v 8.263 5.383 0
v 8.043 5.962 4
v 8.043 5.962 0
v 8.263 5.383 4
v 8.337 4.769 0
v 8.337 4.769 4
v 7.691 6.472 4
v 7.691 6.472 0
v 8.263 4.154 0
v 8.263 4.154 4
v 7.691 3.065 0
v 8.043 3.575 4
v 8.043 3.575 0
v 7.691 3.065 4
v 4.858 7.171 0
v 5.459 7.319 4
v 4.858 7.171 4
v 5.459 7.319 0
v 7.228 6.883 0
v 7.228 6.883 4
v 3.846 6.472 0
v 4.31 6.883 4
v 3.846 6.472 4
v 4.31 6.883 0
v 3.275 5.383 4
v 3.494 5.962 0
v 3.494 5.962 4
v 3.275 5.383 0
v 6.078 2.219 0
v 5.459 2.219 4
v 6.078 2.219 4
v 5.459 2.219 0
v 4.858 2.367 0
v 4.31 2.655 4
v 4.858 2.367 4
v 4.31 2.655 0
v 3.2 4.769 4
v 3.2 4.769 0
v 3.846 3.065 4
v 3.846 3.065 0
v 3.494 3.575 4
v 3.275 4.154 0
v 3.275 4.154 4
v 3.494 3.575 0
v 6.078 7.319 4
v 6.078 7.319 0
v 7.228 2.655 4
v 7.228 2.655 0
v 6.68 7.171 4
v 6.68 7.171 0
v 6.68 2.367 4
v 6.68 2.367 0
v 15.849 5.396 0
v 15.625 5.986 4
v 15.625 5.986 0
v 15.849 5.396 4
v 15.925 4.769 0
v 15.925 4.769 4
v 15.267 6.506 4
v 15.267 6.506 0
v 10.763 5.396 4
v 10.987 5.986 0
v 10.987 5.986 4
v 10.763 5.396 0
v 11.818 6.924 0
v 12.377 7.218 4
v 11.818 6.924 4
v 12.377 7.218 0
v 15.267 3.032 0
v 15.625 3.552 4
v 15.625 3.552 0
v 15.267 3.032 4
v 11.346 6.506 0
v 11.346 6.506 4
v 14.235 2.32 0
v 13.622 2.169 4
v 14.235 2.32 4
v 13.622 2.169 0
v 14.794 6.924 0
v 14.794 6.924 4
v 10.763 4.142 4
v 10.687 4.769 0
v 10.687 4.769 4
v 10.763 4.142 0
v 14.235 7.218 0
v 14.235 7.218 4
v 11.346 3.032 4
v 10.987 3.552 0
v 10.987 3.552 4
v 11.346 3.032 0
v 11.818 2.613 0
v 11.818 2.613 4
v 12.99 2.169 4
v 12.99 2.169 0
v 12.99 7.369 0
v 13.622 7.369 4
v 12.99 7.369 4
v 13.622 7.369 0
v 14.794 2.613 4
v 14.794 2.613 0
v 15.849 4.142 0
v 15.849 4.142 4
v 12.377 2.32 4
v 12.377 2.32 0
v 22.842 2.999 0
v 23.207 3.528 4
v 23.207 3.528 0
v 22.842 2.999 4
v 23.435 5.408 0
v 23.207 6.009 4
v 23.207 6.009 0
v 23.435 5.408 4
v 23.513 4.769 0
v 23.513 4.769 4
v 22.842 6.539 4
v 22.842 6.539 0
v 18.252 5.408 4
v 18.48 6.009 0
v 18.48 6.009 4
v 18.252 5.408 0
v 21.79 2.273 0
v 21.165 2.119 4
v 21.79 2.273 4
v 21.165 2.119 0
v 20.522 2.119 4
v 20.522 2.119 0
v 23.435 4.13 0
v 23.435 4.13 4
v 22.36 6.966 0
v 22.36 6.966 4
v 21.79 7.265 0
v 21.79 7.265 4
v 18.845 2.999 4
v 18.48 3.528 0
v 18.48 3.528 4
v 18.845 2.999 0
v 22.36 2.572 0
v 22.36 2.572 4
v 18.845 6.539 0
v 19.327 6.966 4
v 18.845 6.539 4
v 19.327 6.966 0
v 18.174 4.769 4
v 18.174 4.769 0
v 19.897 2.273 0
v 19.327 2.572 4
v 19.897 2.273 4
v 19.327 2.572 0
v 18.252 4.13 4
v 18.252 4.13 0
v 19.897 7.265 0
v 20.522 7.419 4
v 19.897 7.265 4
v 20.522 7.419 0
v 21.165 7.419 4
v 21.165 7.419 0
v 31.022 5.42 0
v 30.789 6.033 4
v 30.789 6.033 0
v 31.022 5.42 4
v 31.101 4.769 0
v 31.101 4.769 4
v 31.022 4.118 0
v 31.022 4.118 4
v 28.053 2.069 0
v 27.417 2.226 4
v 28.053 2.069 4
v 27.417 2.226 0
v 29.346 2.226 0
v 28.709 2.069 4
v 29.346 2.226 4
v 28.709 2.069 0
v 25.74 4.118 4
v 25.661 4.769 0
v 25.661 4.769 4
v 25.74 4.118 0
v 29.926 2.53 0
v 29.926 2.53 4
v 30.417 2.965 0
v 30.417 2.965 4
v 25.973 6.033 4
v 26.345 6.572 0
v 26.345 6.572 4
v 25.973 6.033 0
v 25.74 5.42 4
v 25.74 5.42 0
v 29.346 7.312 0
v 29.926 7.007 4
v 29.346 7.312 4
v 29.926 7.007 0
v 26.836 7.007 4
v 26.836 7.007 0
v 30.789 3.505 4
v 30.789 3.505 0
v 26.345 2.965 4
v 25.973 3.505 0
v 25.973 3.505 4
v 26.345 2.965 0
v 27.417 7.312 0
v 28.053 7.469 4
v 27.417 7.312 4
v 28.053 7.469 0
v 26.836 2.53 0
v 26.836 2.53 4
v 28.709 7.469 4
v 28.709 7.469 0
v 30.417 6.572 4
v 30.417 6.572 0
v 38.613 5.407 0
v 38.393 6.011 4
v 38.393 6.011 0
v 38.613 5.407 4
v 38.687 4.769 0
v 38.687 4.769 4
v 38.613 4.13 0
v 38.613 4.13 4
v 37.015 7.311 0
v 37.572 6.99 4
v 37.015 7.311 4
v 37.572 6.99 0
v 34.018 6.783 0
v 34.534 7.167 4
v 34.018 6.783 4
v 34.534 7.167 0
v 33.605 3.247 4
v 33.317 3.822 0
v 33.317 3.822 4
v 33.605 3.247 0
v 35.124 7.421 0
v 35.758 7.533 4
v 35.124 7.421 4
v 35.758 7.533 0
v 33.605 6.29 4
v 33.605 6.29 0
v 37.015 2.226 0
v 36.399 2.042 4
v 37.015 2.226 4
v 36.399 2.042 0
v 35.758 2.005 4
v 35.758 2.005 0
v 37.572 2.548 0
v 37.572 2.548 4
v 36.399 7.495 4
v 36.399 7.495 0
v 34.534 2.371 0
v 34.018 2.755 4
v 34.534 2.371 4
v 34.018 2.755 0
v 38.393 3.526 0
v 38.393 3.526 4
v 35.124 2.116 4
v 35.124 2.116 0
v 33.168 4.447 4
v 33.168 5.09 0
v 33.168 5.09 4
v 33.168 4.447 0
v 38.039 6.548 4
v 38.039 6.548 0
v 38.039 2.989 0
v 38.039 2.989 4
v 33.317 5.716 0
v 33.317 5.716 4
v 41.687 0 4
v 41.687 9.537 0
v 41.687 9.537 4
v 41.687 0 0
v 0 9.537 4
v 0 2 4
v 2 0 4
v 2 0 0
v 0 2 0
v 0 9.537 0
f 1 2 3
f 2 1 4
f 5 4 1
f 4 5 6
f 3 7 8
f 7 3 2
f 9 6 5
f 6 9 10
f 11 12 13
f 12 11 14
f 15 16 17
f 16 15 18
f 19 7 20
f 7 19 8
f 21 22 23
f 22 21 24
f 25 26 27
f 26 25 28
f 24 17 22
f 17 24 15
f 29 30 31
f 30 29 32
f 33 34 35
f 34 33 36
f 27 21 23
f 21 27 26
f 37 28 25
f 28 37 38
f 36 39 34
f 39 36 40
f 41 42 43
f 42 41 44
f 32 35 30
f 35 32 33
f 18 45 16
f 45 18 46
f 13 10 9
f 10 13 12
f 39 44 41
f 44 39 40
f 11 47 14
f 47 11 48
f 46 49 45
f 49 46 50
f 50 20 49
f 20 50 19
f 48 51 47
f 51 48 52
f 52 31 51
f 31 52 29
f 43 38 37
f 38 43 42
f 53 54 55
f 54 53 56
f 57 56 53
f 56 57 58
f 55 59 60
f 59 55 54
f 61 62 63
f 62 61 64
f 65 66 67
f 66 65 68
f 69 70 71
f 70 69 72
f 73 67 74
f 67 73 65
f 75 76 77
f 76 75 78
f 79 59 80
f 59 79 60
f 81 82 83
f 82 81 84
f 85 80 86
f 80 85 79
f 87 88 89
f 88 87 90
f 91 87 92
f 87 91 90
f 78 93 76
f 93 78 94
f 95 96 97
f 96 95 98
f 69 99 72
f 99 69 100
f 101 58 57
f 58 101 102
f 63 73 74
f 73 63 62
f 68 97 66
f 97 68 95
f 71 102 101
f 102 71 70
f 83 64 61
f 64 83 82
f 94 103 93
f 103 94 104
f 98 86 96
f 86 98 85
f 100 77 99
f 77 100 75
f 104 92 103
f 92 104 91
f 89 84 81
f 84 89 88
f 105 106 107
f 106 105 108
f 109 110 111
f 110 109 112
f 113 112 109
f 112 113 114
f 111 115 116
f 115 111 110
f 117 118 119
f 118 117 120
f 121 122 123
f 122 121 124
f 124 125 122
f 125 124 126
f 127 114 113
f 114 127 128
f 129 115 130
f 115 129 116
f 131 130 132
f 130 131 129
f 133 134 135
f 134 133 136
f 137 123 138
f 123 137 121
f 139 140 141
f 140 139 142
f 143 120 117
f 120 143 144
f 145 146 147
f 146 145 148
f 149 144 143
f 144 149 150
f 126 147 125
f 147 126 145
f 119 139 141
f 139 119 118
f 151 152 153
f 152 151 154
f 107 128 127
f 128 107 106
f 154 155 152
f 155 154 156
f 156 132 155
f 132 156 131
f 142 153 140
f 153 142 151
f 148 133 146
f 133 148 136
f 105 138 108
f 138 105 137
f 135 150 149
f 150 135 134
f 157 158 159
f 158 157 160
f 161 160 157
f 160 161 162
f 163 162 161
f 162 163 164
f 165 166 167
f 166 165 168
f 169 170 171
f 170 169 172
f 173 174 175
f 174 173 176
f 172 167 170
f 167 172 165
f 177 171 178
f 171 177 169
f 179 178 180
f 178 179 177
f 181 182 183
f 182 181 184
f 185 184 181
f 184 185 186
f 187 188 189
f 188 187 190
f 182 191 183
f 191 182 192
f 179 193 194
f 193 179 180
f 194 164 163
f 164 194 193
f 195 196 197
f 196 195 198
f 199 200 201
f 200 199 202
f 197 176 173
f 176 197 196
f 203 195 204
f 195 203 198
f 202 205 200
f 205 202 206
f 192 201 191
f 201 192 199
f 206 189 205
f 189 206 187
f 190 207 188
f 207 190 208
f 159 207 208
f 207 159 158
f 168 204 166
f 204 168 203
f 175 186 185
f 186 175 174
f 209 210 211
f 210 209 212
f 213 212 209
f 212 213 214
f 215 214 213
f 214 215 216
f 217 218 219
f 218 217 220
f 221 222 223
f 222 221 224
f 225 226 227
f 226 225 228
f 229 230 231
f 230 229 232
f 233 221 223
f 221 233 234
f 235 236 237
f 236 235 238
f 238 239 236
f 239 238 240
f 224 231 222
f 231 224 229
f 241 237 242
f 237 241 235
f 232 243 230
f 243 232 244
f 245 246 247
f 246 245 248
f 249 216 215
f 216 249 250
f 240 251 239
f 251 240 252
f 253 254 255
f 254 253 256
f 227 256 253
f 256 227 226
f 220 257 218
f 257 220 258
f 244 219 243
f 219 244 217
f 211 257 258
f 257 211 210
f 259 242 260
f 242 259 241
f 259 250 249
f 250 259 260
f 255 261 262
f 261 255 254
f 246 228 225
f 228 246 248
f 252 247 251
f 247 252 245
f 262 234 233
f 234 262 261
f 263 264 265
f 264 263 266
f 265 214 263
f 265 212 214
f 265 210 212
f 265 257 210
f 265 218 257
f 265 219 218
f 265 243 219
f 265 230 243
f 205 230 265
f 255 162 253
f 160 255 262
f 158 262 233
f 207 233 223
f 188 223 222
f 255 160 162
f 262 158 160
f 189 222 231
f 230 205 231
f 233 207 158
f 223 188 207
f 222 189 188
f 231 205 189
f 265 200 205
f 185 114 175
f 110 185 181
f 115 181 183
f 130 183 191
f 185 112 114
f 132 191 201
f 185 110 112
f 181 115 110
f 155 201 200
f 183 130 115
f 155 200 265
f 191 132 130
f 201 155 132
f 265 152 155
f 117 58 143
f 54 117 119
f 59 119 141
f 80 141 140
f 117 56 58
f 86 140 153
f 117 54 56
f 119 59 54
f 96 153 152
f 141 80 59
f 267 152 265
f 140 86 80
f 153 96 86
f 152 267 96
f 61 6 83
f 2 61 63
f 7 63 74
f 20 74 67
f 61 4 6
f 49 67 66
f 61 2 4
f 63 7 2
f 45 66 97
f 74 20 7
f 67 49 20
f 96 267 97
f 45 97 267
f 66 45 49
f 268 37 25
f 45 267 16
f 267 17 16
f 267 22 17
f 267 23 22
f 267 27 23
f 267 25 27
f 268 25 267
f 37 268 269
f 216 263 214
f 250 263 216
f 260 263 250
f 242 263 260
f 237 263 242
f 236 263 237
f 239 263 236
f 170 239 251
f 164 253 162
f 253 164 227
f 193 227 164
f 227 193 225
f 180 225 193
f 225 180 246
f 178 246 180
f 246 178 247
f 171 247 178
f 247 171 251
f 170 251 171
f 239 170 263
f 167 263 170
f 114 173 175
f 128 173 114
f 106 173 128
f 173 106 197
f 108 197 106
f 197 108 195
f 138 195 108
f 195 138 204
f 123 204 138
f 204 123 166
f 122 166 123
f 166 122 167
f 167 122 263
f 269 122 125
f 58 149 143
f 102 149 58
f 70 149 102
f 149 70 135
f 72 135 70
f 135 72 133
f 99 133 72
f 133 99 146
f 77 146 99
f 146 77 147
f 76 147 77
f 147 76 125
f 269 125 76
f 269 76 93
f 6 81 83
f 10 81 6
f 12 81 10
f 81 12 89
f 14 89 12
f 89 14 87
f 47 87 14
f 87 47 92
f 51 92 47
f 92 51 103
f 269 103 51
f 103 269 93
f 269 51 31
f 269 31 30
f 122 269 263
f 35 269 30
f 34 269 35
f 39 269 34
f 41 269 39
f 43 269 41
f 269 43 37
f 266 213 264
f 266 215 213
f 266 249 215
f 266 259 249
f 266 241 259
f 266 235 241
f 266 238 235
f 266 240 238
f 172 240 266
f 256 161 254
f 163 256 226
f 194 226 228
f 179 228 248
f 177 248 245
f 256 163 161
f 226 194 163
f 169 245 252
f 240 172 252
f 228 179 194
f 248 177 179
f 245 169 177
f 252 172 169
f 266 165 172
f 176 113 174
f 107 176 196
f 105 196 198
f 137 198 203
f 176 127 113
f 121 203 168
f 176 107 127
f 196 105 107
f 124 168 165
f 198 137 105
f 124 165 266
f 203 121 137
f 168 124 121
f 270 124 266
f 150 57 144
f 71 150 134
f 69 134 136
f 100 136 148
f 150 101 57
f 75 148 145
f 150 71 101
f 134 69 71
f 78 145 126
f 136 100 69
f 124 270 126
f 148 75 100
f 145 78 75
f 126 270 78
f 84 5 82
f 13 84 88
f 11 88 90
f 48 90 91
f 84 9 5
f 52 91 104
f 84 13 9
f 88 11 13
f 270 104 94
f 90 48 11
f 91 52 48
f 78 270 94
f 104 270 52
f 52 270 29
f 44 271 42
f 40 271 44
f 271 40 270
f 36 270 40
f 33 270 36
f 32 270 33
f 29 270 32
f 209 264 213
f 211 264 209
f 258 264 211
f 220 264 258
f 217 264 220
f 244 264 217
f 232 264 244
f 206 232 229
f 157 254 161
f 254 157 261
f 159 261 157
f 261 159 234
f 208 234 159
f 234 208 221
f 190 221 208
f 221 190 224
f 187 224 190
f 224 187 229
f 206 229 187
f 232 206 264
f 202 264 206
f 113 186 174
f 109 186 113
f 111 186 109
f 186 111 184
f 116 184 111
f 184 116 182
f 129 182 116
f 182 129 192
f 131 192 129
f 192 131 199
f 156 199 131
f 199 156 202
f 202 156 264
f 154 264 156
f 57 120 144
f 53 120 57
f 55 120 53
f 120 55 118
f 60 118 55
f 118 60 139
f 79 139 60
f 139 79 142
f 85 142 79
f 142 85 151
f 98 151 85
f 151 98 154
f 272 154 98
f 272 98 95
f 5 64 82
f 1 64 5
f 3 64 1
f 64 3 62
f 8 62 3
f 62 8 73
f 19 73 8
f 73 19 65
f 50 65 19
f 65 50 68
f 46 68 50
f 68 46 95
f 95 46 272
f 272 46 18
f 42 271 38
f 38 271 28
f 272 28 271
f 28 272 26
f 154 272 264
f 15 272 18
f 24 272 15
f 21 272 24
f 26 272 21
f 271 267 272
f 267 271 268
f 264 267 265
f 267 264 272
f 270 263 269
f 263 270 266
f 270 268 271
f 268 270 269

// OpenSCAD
// DIAMETRAL CLEARANCE COUPON (handbook section 15). Units: mm.
// A strip of through-holes, each larger than a nominal pin by a test clearance.
// Diametral clearance = hole diameter - pin diameter; radial clearance is half.
// These are EXAMPLE TEST SETTINGS, not recommended fits or claims about any printer.
// Print in the intended material, orientation, layer settings, and cooling;
// test with the real mating pin, in the finished (primed/painted) state.
//
// Override any value from the command line, for example:
//   openscad -o coupon.stl -D pin_diameter=3 -D 'label_mode="engrave"' clearance-coupon.scad
//
// The hole nearest the corner notch (x = 0 end) has the smallest clearance.

pin_diameter = 5;          // measured diameter of the real mating pin
clearance_start = 0.10;    // first diametral clearance
clearance_step = 0.10;     // increment between holes
clearance_count = 5;       // number of holes
thickness = 4;             // coupon thickness (Z)
min_wall = 2;              // minimum material between holes and to the long edges
end_wall = 3;              // material from the outer holes to the ends (>= min_wall)
chord_error = 0.02;        // maximum radial deviation of each polygonal hole
compensate_polygon = true; // place polygon flats (not vertices) on the hole diameter
label_mode = "none";       // "none", "engrave", or "emboss" clearance labels
label_size = 3;            // text height
label_depth = 0.6;         // engrave depth or emboss height
index_notch = true;        // corner chamfer marking the smallest-clearance end
notch_size = 2;            // chamfer leg length

function clearance(i) = clearance_start + i * clearance_step;
function hole_d(i) = pin_diameter + clearance(i);
// Segment count from the tessellation formula n >= pi / acos(1 - e / r)
// (OpenSCAD acos returns degrees, so pi becomes 180).
function segments(d) = max(16, ceil(180 / acos(1 - chord_error / (d / 2))));
// A polygon with vertices on radius R has flats at R cos(180 / n). Enlarging R
// by 1 / cos(180 / n) makes the largest pin that passes equal the hole diameter.
function poly_r(d) = (compensate_polygon ? 1 / cos(180 / segments(d)) : 1) * d / 2;

holes = [for (i = [0 : clearance_count - 1]) hole_d(i)];
max_r = max([for (d = holes) poly_r(d)]);
pitch = 2 * max_r + min_wall;
hole_band = 2 * (min_wall + max_r);
label_band = label_mode == "none" ? 0 : label_size + min_wall;
coupon_length = 2 * (end_wall + max_r) + (clearance_count - 1) * pitch;
coupon_width = hole_band + label_band;
hole_y = min_wall + max_r;
function hole_x(i) = end_wall + max_r + i * pitch;

assert(pin_diameter > 0 && thickness > 0 && min_wall > 0, "sizes must be positive");
assert(clearance_count >= 1 && clearance_count == floor(clearance_count), "clearance_count must be a positive integer");
assert(min(holes) > 0, "every hole diameter must be positive");
assert(end_wall >= min_wall, "end_wall must be at least min_wall");
assert(chord_error > 0 && chord_error < min(holes) / 2, "chord_error must be between 0 and the smallest hole radius");
assert(label_mode == "none" || label_mode == "engrave" || label_mode == "emboss", "label_mode must be none, engrave, or emboss");
assert(label_mode != "engrave" || label_depth < thickness, "engrave depth must be less than thickness");
// The notch edge (x + y = notch_size) must stay at least min_wall from hole 0.
assert(!index_notch || (hole_x(0) + hole_y - notch_size) / sqrt(2) - max_r >= min_wall,
       "notch_size is too large for the first hole");

module labels(height) {
    for (i = [0 : clearance_count - 1])
        translate([hole_x(i), hole_band + label_size / 2, 0])
            linear_extrude(height = height)
                text(str(clearance(i)), size = label_size, halign = "center", valign = "center");
}

module body() {
    difference() {
        cube([coupon_length, coupon_width, thickness]);
        for (i = [0 : clearance_count - 1])
            translate([hole_x(i), hole_y, -0.1])
                cylinder(h = thickness + 0.2, r = poly_r(holes[i]), $fn = segments(holes[i]));
        if (index_notch)
            translate([0, 0, -0.1])
                linear_extrude(height = thickness + 0.2)
                    polygon([[-0.1, -0.1], [notch_size + 0.1, -0.1], [-0.1, notch_size + 0.1]]);
        if (label_mode == "engrave")
            translate([0, 0, thickness - label_depth]) labels(label_depth + 0.1);
    }
}

if (label_mode == "emboss") {
    union() {
        body();
        translate([0, 0, thickness - 0.01]) labels(label_depth + 0.01);
    }
} else {
    body();
}

echo(str("COUPON length=", coupon_length, " width=", coupon_width, " pitch=", pitch,
         " holes=", holes, " segments=", [for (d = holes) segments(d)]));
